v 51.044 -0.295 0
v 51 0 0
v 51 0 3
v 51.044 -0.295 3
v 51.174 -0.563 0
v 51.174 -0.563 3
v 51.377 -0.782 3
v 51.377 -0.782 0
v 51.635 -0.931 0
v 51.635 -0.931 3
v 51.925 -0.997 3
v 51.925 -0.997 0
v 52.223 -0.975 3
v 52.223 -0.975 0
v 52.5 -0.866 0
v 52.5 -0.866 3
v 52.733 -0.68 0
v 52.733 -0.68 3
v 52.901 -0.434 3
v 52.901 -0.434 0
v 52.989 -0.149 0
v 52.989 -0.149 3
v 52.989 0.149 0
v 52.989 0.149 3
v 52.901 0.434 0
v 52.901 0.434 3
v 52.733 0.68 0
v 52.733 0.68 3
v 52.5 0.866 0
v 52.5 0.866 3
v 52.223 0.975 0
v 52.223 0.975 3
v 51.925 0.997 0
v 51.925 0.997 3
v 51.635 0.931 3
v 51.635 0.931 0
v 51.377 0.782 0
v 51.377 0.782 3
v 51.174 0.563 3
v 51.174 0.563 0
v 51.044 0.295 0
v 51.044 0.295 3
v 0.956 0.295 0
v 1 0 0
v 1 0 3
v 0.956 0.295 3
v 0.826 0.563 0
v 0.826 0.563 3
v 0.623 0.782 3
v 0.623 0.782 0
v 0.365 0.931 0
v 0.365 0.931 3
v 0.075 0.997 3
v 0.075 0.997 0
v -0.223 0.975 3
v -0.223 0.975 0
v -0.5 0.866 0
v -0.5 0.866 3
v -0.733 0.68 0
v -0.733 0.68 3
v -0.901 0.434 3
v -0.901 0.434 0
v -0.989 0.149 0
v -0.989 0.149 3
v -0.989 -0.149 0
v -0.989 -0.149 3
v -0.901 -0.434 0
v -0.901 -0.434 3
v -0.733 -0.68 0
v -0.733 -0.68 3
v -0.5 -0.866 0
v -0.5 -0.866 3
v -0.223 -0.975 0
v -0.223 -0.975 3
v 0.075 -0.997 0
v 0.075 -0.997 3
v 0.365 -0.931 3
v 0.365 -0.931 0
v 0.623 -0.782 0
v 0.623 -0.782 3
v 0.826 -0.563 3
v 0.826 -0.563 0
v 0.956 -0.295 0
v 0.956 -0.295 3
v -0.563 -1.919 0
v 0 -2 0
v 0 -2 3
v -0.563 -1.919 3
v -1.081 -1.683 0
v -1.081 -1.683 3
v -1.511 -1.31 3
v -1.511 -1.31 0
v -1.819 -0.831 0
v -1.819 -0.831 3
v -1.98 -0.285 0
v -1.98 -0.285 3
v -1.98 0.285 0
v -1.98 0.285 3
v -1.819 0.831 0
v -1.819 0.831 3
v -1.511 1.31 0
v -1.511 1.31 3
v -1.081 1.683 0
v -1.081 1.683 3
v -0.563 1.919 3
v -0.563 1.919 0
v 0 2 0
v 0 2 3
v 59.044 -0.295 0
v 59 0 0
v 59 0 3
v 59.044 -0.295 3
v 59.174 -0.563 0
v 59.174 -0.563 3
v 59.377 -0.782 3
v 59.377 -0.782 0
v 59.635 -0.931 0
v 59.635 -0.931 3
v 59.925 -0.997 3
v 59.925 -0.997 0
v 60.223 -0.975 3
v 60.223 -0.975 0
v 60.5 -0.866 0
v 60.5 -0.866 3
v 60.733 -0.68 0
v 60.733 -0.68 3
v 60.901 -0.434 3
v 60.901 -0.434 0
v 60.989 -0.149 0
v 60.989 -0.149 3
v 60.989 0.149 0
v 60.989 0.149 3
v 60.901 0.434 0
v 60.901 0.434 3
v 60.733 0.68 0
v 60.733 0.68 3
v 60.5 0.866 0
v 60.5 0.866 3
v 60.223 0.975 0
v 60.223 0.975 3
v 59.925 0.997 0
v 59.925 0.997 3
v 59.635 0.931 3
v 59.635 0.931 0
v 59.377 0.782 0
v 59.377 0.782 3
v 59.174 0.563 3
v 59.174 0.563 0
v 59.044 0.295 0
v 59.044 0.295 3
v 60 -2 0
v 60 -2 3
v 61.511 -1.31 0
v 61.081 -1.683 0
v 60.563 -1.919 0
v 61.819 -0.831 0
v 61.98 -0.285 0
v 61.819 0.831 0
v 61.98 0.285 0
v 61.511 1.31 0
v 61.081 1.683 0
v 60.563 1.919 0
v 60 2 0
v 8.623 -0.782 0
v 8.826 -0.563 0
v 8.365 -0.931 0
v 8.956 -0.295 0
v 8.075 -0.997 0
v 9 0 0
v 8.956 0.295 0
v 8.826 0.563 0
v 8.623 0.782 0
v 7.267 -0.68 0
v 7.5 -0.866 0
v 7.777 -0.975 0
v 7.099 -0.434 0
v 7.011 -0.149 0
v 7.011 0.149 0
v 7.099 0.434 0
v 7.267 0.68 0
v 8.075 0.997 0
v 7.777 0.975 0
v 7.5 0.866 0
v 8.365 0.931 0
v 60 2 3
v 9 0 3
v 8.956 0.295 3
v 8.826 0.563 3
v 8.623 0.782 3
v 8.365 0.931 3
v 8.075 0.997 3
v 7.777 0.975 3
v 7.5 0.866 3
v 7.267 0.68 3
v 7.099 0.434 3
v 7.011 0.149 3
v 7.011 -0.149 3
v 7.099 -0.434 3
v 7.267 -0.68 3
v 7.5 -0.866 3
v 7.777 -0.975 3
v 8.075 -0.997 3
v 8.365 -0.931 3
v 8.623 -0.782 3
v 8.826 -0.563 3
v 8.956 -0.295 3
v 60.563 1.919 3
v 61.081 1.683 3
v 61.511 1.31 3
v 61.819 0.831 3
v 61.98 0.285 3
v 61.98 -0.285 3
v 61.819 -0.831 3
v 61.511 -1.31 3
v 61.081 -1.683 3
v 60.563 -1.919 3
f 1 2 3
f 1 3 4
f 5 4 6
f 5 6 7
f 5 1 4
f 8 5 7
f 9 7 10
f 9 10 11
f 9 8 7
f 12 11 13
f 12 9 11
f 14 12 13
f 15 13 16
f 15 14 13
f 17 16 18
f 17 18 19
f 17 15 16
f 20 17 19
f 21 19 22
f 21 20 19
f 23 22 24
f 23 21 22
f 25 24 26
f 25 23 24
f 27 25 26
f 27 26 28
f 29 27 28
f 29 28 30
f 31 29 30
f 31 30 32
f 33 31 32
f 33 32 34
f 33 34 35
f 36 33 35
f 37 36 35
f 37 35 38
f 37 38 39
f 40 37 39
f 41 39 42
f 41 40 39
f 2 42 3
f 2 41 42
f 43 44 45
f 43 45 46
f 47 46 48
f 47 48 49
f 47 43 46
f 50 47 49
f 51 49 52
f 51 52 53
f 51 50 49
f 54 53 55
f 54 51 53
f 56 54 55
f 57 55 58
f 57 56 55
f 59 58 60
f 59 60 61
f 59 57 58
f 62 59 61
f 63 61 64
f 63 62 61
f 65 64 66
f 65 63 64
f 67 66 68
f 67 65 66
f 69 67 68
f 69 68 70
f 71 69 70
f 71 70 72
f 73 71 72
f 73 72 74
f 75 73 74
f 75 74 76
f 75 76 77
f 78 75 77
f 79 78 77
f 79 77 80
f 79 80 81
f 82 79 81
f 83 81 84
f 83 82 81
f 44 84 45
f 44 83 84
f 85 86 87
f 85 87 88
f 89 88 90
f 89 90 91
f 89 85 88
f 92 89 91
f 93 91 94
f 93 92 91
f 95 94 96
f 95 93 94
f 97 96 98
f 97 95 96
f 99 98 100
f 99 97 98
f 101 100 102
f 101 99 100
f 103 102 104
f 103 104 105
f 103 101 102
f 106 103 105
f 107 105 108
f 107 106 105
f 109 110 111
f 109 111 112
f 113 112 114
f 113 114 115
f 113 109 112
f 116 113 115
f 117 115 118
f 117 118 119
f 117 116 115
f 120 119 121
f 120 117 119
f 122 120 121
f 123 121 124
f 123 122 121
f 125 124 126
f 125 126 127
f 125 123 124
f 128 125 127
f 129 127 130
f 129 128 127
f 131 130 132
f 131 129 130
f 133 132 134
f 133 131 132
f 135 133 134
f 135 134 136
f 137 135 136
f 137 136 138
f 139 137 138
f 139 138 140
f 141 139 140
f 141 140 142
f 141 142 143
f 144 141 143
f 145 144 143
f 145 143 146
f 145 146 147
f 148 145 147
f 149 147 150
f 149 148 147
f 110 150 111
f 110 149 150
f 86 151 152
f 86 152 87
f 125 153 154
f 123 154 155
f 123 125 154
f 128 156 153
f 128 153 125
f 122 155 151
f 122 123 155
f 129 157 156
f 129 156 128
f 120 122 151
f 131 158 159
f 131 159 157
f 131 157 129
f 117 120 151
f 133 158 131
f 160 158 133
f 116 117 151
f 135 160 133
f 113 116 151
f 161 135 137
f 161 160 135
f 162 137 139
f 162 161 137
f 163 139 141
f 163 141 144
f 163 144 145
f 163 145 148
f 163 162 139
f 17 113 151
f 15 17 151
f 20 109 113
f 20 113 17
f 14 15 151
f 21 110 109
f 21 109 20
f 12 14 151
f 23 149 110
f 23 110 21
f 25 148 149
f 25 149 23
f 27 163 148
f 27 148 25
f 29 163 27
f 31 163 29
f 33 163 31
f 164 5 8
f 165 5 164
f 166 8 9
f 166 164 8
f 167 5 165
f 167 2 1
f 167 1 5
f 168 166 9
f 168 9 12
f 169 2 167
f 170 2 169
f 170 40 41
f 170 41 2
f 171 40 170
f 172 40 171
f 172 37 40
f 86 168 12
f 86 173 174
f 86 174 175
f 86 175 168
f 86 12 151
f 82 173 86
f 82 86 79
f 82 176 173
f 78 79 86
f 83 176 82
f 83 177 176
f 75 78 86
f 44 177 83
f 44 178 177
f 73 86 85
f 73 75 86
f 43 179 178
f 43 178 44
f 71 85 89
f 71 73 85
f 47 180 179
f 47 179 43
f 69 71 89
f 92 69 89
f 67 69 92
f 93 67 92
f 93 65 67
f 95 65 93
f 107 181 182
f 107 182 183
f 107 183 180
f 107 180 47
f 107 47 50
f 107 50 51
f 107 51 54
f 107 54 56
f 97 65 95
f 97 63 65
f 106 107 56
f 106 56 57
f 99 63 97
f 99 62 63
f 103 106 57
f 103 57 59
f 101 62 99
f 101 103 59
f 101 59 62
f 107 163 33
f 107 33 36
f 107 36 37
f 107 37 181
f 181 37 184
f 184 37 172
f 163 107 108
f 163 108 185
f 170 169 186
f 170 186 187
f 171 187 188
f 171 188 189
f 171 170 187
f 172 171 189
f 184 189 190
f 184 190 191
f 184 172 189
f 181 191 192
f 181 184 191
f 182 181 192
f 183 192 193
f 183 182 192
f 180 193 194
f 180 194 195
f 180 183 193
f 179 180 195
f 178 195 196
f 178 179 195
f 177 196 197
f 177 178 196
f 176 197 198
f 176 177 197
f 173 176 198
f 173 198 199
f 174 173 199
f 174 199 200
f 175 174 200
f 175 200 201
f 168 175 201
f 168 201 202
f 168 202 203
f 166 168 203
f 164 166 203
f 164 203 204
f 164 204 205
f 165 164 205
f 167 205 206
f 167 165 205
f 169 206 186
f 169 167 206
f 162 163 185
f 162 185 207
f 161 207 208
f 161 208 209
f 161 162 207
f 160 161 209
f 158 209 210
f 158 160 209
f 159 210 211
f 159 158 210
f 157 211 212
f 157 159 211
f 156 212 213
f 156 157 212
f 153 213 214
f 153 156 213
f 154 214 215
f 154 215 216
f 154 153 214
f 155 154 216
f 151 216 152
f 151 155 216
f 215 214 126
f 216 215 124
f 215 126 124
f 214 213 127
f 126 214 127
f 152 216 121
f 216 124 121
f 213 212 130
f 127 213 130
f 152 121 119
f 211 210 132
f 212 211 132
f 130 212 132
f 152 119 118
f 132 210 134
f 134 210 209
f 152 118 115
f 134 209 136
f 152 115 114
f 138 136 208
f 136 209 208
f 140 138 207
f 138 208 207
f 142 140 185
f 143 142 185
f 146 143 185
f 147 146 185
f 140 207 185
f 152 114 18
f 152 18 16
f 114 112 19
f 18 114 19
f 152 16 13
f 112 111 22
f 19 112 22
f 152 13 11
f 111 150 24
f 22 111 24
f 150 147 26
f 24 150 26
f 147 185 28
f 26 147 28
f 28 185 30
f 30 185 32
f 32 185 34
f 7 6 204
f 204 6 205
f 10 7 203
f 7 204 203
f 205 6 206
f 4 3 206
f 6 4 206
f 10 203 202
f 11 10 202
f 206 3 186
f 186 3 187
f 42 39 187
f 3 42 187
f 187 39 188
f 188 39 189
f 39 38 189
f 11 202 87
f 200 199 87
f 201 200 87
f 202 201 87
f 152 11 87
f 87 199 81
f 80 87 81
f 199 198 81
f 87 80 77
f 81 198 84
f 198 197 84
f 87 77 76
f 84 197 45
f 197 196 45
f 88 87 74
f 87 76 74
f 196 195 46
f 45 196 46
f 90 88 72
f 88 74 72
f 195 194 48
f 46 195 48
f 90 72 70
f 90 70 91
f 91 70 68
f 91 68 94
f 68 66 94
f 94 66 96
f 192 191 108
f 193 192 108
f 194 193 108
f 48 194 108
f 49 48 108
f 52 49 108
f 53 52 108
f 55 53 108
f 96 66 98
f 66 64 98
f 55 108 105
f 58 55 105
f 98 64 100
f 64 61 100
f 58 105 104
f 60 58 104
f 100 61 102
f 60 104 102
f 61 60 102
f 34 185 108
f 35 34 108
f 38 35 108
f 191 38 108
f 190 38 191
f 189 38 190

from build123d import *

# Parameters (mm, degrees)
SKETCH1_R           = 1
BOSS_EXTRUDE1_DEPTH = 3


with BuildPart() as part:
    # Sketch1 → Boss-Extrude1 (new body)
    with BuildSketch(Plane.XY):
        with BuildLine():
            Line((0, 2), (60, 2))
            ThreePointArc((60, 2), (62, 0), (60, -2))
            Line((60, -2), (0, -2))
            ThreePointArc((0, -2), (-2, 0), (0, 2))
        make_face()
        Circle(SKETCH1_R, mode=Mode.SUBTRACT)
        with Locations((8, 0)):
            Circle(SKETCH1_R, mode=Mode.SUBTRACT)
        with Locations(Location((52, 0, 0), (0, 0, 180))):
            Circle(SKETCH1_R, mode=Mode.SUBTRACT)
        with Locations(Location((60, 0, 0), (0, 0, 180))):
            Circle(SKETCH1_R, mode=Mode.SUBTRACT)
    extrude(amount=BOSS_EXTRUDE1_DEPTH)


solid = part.part
